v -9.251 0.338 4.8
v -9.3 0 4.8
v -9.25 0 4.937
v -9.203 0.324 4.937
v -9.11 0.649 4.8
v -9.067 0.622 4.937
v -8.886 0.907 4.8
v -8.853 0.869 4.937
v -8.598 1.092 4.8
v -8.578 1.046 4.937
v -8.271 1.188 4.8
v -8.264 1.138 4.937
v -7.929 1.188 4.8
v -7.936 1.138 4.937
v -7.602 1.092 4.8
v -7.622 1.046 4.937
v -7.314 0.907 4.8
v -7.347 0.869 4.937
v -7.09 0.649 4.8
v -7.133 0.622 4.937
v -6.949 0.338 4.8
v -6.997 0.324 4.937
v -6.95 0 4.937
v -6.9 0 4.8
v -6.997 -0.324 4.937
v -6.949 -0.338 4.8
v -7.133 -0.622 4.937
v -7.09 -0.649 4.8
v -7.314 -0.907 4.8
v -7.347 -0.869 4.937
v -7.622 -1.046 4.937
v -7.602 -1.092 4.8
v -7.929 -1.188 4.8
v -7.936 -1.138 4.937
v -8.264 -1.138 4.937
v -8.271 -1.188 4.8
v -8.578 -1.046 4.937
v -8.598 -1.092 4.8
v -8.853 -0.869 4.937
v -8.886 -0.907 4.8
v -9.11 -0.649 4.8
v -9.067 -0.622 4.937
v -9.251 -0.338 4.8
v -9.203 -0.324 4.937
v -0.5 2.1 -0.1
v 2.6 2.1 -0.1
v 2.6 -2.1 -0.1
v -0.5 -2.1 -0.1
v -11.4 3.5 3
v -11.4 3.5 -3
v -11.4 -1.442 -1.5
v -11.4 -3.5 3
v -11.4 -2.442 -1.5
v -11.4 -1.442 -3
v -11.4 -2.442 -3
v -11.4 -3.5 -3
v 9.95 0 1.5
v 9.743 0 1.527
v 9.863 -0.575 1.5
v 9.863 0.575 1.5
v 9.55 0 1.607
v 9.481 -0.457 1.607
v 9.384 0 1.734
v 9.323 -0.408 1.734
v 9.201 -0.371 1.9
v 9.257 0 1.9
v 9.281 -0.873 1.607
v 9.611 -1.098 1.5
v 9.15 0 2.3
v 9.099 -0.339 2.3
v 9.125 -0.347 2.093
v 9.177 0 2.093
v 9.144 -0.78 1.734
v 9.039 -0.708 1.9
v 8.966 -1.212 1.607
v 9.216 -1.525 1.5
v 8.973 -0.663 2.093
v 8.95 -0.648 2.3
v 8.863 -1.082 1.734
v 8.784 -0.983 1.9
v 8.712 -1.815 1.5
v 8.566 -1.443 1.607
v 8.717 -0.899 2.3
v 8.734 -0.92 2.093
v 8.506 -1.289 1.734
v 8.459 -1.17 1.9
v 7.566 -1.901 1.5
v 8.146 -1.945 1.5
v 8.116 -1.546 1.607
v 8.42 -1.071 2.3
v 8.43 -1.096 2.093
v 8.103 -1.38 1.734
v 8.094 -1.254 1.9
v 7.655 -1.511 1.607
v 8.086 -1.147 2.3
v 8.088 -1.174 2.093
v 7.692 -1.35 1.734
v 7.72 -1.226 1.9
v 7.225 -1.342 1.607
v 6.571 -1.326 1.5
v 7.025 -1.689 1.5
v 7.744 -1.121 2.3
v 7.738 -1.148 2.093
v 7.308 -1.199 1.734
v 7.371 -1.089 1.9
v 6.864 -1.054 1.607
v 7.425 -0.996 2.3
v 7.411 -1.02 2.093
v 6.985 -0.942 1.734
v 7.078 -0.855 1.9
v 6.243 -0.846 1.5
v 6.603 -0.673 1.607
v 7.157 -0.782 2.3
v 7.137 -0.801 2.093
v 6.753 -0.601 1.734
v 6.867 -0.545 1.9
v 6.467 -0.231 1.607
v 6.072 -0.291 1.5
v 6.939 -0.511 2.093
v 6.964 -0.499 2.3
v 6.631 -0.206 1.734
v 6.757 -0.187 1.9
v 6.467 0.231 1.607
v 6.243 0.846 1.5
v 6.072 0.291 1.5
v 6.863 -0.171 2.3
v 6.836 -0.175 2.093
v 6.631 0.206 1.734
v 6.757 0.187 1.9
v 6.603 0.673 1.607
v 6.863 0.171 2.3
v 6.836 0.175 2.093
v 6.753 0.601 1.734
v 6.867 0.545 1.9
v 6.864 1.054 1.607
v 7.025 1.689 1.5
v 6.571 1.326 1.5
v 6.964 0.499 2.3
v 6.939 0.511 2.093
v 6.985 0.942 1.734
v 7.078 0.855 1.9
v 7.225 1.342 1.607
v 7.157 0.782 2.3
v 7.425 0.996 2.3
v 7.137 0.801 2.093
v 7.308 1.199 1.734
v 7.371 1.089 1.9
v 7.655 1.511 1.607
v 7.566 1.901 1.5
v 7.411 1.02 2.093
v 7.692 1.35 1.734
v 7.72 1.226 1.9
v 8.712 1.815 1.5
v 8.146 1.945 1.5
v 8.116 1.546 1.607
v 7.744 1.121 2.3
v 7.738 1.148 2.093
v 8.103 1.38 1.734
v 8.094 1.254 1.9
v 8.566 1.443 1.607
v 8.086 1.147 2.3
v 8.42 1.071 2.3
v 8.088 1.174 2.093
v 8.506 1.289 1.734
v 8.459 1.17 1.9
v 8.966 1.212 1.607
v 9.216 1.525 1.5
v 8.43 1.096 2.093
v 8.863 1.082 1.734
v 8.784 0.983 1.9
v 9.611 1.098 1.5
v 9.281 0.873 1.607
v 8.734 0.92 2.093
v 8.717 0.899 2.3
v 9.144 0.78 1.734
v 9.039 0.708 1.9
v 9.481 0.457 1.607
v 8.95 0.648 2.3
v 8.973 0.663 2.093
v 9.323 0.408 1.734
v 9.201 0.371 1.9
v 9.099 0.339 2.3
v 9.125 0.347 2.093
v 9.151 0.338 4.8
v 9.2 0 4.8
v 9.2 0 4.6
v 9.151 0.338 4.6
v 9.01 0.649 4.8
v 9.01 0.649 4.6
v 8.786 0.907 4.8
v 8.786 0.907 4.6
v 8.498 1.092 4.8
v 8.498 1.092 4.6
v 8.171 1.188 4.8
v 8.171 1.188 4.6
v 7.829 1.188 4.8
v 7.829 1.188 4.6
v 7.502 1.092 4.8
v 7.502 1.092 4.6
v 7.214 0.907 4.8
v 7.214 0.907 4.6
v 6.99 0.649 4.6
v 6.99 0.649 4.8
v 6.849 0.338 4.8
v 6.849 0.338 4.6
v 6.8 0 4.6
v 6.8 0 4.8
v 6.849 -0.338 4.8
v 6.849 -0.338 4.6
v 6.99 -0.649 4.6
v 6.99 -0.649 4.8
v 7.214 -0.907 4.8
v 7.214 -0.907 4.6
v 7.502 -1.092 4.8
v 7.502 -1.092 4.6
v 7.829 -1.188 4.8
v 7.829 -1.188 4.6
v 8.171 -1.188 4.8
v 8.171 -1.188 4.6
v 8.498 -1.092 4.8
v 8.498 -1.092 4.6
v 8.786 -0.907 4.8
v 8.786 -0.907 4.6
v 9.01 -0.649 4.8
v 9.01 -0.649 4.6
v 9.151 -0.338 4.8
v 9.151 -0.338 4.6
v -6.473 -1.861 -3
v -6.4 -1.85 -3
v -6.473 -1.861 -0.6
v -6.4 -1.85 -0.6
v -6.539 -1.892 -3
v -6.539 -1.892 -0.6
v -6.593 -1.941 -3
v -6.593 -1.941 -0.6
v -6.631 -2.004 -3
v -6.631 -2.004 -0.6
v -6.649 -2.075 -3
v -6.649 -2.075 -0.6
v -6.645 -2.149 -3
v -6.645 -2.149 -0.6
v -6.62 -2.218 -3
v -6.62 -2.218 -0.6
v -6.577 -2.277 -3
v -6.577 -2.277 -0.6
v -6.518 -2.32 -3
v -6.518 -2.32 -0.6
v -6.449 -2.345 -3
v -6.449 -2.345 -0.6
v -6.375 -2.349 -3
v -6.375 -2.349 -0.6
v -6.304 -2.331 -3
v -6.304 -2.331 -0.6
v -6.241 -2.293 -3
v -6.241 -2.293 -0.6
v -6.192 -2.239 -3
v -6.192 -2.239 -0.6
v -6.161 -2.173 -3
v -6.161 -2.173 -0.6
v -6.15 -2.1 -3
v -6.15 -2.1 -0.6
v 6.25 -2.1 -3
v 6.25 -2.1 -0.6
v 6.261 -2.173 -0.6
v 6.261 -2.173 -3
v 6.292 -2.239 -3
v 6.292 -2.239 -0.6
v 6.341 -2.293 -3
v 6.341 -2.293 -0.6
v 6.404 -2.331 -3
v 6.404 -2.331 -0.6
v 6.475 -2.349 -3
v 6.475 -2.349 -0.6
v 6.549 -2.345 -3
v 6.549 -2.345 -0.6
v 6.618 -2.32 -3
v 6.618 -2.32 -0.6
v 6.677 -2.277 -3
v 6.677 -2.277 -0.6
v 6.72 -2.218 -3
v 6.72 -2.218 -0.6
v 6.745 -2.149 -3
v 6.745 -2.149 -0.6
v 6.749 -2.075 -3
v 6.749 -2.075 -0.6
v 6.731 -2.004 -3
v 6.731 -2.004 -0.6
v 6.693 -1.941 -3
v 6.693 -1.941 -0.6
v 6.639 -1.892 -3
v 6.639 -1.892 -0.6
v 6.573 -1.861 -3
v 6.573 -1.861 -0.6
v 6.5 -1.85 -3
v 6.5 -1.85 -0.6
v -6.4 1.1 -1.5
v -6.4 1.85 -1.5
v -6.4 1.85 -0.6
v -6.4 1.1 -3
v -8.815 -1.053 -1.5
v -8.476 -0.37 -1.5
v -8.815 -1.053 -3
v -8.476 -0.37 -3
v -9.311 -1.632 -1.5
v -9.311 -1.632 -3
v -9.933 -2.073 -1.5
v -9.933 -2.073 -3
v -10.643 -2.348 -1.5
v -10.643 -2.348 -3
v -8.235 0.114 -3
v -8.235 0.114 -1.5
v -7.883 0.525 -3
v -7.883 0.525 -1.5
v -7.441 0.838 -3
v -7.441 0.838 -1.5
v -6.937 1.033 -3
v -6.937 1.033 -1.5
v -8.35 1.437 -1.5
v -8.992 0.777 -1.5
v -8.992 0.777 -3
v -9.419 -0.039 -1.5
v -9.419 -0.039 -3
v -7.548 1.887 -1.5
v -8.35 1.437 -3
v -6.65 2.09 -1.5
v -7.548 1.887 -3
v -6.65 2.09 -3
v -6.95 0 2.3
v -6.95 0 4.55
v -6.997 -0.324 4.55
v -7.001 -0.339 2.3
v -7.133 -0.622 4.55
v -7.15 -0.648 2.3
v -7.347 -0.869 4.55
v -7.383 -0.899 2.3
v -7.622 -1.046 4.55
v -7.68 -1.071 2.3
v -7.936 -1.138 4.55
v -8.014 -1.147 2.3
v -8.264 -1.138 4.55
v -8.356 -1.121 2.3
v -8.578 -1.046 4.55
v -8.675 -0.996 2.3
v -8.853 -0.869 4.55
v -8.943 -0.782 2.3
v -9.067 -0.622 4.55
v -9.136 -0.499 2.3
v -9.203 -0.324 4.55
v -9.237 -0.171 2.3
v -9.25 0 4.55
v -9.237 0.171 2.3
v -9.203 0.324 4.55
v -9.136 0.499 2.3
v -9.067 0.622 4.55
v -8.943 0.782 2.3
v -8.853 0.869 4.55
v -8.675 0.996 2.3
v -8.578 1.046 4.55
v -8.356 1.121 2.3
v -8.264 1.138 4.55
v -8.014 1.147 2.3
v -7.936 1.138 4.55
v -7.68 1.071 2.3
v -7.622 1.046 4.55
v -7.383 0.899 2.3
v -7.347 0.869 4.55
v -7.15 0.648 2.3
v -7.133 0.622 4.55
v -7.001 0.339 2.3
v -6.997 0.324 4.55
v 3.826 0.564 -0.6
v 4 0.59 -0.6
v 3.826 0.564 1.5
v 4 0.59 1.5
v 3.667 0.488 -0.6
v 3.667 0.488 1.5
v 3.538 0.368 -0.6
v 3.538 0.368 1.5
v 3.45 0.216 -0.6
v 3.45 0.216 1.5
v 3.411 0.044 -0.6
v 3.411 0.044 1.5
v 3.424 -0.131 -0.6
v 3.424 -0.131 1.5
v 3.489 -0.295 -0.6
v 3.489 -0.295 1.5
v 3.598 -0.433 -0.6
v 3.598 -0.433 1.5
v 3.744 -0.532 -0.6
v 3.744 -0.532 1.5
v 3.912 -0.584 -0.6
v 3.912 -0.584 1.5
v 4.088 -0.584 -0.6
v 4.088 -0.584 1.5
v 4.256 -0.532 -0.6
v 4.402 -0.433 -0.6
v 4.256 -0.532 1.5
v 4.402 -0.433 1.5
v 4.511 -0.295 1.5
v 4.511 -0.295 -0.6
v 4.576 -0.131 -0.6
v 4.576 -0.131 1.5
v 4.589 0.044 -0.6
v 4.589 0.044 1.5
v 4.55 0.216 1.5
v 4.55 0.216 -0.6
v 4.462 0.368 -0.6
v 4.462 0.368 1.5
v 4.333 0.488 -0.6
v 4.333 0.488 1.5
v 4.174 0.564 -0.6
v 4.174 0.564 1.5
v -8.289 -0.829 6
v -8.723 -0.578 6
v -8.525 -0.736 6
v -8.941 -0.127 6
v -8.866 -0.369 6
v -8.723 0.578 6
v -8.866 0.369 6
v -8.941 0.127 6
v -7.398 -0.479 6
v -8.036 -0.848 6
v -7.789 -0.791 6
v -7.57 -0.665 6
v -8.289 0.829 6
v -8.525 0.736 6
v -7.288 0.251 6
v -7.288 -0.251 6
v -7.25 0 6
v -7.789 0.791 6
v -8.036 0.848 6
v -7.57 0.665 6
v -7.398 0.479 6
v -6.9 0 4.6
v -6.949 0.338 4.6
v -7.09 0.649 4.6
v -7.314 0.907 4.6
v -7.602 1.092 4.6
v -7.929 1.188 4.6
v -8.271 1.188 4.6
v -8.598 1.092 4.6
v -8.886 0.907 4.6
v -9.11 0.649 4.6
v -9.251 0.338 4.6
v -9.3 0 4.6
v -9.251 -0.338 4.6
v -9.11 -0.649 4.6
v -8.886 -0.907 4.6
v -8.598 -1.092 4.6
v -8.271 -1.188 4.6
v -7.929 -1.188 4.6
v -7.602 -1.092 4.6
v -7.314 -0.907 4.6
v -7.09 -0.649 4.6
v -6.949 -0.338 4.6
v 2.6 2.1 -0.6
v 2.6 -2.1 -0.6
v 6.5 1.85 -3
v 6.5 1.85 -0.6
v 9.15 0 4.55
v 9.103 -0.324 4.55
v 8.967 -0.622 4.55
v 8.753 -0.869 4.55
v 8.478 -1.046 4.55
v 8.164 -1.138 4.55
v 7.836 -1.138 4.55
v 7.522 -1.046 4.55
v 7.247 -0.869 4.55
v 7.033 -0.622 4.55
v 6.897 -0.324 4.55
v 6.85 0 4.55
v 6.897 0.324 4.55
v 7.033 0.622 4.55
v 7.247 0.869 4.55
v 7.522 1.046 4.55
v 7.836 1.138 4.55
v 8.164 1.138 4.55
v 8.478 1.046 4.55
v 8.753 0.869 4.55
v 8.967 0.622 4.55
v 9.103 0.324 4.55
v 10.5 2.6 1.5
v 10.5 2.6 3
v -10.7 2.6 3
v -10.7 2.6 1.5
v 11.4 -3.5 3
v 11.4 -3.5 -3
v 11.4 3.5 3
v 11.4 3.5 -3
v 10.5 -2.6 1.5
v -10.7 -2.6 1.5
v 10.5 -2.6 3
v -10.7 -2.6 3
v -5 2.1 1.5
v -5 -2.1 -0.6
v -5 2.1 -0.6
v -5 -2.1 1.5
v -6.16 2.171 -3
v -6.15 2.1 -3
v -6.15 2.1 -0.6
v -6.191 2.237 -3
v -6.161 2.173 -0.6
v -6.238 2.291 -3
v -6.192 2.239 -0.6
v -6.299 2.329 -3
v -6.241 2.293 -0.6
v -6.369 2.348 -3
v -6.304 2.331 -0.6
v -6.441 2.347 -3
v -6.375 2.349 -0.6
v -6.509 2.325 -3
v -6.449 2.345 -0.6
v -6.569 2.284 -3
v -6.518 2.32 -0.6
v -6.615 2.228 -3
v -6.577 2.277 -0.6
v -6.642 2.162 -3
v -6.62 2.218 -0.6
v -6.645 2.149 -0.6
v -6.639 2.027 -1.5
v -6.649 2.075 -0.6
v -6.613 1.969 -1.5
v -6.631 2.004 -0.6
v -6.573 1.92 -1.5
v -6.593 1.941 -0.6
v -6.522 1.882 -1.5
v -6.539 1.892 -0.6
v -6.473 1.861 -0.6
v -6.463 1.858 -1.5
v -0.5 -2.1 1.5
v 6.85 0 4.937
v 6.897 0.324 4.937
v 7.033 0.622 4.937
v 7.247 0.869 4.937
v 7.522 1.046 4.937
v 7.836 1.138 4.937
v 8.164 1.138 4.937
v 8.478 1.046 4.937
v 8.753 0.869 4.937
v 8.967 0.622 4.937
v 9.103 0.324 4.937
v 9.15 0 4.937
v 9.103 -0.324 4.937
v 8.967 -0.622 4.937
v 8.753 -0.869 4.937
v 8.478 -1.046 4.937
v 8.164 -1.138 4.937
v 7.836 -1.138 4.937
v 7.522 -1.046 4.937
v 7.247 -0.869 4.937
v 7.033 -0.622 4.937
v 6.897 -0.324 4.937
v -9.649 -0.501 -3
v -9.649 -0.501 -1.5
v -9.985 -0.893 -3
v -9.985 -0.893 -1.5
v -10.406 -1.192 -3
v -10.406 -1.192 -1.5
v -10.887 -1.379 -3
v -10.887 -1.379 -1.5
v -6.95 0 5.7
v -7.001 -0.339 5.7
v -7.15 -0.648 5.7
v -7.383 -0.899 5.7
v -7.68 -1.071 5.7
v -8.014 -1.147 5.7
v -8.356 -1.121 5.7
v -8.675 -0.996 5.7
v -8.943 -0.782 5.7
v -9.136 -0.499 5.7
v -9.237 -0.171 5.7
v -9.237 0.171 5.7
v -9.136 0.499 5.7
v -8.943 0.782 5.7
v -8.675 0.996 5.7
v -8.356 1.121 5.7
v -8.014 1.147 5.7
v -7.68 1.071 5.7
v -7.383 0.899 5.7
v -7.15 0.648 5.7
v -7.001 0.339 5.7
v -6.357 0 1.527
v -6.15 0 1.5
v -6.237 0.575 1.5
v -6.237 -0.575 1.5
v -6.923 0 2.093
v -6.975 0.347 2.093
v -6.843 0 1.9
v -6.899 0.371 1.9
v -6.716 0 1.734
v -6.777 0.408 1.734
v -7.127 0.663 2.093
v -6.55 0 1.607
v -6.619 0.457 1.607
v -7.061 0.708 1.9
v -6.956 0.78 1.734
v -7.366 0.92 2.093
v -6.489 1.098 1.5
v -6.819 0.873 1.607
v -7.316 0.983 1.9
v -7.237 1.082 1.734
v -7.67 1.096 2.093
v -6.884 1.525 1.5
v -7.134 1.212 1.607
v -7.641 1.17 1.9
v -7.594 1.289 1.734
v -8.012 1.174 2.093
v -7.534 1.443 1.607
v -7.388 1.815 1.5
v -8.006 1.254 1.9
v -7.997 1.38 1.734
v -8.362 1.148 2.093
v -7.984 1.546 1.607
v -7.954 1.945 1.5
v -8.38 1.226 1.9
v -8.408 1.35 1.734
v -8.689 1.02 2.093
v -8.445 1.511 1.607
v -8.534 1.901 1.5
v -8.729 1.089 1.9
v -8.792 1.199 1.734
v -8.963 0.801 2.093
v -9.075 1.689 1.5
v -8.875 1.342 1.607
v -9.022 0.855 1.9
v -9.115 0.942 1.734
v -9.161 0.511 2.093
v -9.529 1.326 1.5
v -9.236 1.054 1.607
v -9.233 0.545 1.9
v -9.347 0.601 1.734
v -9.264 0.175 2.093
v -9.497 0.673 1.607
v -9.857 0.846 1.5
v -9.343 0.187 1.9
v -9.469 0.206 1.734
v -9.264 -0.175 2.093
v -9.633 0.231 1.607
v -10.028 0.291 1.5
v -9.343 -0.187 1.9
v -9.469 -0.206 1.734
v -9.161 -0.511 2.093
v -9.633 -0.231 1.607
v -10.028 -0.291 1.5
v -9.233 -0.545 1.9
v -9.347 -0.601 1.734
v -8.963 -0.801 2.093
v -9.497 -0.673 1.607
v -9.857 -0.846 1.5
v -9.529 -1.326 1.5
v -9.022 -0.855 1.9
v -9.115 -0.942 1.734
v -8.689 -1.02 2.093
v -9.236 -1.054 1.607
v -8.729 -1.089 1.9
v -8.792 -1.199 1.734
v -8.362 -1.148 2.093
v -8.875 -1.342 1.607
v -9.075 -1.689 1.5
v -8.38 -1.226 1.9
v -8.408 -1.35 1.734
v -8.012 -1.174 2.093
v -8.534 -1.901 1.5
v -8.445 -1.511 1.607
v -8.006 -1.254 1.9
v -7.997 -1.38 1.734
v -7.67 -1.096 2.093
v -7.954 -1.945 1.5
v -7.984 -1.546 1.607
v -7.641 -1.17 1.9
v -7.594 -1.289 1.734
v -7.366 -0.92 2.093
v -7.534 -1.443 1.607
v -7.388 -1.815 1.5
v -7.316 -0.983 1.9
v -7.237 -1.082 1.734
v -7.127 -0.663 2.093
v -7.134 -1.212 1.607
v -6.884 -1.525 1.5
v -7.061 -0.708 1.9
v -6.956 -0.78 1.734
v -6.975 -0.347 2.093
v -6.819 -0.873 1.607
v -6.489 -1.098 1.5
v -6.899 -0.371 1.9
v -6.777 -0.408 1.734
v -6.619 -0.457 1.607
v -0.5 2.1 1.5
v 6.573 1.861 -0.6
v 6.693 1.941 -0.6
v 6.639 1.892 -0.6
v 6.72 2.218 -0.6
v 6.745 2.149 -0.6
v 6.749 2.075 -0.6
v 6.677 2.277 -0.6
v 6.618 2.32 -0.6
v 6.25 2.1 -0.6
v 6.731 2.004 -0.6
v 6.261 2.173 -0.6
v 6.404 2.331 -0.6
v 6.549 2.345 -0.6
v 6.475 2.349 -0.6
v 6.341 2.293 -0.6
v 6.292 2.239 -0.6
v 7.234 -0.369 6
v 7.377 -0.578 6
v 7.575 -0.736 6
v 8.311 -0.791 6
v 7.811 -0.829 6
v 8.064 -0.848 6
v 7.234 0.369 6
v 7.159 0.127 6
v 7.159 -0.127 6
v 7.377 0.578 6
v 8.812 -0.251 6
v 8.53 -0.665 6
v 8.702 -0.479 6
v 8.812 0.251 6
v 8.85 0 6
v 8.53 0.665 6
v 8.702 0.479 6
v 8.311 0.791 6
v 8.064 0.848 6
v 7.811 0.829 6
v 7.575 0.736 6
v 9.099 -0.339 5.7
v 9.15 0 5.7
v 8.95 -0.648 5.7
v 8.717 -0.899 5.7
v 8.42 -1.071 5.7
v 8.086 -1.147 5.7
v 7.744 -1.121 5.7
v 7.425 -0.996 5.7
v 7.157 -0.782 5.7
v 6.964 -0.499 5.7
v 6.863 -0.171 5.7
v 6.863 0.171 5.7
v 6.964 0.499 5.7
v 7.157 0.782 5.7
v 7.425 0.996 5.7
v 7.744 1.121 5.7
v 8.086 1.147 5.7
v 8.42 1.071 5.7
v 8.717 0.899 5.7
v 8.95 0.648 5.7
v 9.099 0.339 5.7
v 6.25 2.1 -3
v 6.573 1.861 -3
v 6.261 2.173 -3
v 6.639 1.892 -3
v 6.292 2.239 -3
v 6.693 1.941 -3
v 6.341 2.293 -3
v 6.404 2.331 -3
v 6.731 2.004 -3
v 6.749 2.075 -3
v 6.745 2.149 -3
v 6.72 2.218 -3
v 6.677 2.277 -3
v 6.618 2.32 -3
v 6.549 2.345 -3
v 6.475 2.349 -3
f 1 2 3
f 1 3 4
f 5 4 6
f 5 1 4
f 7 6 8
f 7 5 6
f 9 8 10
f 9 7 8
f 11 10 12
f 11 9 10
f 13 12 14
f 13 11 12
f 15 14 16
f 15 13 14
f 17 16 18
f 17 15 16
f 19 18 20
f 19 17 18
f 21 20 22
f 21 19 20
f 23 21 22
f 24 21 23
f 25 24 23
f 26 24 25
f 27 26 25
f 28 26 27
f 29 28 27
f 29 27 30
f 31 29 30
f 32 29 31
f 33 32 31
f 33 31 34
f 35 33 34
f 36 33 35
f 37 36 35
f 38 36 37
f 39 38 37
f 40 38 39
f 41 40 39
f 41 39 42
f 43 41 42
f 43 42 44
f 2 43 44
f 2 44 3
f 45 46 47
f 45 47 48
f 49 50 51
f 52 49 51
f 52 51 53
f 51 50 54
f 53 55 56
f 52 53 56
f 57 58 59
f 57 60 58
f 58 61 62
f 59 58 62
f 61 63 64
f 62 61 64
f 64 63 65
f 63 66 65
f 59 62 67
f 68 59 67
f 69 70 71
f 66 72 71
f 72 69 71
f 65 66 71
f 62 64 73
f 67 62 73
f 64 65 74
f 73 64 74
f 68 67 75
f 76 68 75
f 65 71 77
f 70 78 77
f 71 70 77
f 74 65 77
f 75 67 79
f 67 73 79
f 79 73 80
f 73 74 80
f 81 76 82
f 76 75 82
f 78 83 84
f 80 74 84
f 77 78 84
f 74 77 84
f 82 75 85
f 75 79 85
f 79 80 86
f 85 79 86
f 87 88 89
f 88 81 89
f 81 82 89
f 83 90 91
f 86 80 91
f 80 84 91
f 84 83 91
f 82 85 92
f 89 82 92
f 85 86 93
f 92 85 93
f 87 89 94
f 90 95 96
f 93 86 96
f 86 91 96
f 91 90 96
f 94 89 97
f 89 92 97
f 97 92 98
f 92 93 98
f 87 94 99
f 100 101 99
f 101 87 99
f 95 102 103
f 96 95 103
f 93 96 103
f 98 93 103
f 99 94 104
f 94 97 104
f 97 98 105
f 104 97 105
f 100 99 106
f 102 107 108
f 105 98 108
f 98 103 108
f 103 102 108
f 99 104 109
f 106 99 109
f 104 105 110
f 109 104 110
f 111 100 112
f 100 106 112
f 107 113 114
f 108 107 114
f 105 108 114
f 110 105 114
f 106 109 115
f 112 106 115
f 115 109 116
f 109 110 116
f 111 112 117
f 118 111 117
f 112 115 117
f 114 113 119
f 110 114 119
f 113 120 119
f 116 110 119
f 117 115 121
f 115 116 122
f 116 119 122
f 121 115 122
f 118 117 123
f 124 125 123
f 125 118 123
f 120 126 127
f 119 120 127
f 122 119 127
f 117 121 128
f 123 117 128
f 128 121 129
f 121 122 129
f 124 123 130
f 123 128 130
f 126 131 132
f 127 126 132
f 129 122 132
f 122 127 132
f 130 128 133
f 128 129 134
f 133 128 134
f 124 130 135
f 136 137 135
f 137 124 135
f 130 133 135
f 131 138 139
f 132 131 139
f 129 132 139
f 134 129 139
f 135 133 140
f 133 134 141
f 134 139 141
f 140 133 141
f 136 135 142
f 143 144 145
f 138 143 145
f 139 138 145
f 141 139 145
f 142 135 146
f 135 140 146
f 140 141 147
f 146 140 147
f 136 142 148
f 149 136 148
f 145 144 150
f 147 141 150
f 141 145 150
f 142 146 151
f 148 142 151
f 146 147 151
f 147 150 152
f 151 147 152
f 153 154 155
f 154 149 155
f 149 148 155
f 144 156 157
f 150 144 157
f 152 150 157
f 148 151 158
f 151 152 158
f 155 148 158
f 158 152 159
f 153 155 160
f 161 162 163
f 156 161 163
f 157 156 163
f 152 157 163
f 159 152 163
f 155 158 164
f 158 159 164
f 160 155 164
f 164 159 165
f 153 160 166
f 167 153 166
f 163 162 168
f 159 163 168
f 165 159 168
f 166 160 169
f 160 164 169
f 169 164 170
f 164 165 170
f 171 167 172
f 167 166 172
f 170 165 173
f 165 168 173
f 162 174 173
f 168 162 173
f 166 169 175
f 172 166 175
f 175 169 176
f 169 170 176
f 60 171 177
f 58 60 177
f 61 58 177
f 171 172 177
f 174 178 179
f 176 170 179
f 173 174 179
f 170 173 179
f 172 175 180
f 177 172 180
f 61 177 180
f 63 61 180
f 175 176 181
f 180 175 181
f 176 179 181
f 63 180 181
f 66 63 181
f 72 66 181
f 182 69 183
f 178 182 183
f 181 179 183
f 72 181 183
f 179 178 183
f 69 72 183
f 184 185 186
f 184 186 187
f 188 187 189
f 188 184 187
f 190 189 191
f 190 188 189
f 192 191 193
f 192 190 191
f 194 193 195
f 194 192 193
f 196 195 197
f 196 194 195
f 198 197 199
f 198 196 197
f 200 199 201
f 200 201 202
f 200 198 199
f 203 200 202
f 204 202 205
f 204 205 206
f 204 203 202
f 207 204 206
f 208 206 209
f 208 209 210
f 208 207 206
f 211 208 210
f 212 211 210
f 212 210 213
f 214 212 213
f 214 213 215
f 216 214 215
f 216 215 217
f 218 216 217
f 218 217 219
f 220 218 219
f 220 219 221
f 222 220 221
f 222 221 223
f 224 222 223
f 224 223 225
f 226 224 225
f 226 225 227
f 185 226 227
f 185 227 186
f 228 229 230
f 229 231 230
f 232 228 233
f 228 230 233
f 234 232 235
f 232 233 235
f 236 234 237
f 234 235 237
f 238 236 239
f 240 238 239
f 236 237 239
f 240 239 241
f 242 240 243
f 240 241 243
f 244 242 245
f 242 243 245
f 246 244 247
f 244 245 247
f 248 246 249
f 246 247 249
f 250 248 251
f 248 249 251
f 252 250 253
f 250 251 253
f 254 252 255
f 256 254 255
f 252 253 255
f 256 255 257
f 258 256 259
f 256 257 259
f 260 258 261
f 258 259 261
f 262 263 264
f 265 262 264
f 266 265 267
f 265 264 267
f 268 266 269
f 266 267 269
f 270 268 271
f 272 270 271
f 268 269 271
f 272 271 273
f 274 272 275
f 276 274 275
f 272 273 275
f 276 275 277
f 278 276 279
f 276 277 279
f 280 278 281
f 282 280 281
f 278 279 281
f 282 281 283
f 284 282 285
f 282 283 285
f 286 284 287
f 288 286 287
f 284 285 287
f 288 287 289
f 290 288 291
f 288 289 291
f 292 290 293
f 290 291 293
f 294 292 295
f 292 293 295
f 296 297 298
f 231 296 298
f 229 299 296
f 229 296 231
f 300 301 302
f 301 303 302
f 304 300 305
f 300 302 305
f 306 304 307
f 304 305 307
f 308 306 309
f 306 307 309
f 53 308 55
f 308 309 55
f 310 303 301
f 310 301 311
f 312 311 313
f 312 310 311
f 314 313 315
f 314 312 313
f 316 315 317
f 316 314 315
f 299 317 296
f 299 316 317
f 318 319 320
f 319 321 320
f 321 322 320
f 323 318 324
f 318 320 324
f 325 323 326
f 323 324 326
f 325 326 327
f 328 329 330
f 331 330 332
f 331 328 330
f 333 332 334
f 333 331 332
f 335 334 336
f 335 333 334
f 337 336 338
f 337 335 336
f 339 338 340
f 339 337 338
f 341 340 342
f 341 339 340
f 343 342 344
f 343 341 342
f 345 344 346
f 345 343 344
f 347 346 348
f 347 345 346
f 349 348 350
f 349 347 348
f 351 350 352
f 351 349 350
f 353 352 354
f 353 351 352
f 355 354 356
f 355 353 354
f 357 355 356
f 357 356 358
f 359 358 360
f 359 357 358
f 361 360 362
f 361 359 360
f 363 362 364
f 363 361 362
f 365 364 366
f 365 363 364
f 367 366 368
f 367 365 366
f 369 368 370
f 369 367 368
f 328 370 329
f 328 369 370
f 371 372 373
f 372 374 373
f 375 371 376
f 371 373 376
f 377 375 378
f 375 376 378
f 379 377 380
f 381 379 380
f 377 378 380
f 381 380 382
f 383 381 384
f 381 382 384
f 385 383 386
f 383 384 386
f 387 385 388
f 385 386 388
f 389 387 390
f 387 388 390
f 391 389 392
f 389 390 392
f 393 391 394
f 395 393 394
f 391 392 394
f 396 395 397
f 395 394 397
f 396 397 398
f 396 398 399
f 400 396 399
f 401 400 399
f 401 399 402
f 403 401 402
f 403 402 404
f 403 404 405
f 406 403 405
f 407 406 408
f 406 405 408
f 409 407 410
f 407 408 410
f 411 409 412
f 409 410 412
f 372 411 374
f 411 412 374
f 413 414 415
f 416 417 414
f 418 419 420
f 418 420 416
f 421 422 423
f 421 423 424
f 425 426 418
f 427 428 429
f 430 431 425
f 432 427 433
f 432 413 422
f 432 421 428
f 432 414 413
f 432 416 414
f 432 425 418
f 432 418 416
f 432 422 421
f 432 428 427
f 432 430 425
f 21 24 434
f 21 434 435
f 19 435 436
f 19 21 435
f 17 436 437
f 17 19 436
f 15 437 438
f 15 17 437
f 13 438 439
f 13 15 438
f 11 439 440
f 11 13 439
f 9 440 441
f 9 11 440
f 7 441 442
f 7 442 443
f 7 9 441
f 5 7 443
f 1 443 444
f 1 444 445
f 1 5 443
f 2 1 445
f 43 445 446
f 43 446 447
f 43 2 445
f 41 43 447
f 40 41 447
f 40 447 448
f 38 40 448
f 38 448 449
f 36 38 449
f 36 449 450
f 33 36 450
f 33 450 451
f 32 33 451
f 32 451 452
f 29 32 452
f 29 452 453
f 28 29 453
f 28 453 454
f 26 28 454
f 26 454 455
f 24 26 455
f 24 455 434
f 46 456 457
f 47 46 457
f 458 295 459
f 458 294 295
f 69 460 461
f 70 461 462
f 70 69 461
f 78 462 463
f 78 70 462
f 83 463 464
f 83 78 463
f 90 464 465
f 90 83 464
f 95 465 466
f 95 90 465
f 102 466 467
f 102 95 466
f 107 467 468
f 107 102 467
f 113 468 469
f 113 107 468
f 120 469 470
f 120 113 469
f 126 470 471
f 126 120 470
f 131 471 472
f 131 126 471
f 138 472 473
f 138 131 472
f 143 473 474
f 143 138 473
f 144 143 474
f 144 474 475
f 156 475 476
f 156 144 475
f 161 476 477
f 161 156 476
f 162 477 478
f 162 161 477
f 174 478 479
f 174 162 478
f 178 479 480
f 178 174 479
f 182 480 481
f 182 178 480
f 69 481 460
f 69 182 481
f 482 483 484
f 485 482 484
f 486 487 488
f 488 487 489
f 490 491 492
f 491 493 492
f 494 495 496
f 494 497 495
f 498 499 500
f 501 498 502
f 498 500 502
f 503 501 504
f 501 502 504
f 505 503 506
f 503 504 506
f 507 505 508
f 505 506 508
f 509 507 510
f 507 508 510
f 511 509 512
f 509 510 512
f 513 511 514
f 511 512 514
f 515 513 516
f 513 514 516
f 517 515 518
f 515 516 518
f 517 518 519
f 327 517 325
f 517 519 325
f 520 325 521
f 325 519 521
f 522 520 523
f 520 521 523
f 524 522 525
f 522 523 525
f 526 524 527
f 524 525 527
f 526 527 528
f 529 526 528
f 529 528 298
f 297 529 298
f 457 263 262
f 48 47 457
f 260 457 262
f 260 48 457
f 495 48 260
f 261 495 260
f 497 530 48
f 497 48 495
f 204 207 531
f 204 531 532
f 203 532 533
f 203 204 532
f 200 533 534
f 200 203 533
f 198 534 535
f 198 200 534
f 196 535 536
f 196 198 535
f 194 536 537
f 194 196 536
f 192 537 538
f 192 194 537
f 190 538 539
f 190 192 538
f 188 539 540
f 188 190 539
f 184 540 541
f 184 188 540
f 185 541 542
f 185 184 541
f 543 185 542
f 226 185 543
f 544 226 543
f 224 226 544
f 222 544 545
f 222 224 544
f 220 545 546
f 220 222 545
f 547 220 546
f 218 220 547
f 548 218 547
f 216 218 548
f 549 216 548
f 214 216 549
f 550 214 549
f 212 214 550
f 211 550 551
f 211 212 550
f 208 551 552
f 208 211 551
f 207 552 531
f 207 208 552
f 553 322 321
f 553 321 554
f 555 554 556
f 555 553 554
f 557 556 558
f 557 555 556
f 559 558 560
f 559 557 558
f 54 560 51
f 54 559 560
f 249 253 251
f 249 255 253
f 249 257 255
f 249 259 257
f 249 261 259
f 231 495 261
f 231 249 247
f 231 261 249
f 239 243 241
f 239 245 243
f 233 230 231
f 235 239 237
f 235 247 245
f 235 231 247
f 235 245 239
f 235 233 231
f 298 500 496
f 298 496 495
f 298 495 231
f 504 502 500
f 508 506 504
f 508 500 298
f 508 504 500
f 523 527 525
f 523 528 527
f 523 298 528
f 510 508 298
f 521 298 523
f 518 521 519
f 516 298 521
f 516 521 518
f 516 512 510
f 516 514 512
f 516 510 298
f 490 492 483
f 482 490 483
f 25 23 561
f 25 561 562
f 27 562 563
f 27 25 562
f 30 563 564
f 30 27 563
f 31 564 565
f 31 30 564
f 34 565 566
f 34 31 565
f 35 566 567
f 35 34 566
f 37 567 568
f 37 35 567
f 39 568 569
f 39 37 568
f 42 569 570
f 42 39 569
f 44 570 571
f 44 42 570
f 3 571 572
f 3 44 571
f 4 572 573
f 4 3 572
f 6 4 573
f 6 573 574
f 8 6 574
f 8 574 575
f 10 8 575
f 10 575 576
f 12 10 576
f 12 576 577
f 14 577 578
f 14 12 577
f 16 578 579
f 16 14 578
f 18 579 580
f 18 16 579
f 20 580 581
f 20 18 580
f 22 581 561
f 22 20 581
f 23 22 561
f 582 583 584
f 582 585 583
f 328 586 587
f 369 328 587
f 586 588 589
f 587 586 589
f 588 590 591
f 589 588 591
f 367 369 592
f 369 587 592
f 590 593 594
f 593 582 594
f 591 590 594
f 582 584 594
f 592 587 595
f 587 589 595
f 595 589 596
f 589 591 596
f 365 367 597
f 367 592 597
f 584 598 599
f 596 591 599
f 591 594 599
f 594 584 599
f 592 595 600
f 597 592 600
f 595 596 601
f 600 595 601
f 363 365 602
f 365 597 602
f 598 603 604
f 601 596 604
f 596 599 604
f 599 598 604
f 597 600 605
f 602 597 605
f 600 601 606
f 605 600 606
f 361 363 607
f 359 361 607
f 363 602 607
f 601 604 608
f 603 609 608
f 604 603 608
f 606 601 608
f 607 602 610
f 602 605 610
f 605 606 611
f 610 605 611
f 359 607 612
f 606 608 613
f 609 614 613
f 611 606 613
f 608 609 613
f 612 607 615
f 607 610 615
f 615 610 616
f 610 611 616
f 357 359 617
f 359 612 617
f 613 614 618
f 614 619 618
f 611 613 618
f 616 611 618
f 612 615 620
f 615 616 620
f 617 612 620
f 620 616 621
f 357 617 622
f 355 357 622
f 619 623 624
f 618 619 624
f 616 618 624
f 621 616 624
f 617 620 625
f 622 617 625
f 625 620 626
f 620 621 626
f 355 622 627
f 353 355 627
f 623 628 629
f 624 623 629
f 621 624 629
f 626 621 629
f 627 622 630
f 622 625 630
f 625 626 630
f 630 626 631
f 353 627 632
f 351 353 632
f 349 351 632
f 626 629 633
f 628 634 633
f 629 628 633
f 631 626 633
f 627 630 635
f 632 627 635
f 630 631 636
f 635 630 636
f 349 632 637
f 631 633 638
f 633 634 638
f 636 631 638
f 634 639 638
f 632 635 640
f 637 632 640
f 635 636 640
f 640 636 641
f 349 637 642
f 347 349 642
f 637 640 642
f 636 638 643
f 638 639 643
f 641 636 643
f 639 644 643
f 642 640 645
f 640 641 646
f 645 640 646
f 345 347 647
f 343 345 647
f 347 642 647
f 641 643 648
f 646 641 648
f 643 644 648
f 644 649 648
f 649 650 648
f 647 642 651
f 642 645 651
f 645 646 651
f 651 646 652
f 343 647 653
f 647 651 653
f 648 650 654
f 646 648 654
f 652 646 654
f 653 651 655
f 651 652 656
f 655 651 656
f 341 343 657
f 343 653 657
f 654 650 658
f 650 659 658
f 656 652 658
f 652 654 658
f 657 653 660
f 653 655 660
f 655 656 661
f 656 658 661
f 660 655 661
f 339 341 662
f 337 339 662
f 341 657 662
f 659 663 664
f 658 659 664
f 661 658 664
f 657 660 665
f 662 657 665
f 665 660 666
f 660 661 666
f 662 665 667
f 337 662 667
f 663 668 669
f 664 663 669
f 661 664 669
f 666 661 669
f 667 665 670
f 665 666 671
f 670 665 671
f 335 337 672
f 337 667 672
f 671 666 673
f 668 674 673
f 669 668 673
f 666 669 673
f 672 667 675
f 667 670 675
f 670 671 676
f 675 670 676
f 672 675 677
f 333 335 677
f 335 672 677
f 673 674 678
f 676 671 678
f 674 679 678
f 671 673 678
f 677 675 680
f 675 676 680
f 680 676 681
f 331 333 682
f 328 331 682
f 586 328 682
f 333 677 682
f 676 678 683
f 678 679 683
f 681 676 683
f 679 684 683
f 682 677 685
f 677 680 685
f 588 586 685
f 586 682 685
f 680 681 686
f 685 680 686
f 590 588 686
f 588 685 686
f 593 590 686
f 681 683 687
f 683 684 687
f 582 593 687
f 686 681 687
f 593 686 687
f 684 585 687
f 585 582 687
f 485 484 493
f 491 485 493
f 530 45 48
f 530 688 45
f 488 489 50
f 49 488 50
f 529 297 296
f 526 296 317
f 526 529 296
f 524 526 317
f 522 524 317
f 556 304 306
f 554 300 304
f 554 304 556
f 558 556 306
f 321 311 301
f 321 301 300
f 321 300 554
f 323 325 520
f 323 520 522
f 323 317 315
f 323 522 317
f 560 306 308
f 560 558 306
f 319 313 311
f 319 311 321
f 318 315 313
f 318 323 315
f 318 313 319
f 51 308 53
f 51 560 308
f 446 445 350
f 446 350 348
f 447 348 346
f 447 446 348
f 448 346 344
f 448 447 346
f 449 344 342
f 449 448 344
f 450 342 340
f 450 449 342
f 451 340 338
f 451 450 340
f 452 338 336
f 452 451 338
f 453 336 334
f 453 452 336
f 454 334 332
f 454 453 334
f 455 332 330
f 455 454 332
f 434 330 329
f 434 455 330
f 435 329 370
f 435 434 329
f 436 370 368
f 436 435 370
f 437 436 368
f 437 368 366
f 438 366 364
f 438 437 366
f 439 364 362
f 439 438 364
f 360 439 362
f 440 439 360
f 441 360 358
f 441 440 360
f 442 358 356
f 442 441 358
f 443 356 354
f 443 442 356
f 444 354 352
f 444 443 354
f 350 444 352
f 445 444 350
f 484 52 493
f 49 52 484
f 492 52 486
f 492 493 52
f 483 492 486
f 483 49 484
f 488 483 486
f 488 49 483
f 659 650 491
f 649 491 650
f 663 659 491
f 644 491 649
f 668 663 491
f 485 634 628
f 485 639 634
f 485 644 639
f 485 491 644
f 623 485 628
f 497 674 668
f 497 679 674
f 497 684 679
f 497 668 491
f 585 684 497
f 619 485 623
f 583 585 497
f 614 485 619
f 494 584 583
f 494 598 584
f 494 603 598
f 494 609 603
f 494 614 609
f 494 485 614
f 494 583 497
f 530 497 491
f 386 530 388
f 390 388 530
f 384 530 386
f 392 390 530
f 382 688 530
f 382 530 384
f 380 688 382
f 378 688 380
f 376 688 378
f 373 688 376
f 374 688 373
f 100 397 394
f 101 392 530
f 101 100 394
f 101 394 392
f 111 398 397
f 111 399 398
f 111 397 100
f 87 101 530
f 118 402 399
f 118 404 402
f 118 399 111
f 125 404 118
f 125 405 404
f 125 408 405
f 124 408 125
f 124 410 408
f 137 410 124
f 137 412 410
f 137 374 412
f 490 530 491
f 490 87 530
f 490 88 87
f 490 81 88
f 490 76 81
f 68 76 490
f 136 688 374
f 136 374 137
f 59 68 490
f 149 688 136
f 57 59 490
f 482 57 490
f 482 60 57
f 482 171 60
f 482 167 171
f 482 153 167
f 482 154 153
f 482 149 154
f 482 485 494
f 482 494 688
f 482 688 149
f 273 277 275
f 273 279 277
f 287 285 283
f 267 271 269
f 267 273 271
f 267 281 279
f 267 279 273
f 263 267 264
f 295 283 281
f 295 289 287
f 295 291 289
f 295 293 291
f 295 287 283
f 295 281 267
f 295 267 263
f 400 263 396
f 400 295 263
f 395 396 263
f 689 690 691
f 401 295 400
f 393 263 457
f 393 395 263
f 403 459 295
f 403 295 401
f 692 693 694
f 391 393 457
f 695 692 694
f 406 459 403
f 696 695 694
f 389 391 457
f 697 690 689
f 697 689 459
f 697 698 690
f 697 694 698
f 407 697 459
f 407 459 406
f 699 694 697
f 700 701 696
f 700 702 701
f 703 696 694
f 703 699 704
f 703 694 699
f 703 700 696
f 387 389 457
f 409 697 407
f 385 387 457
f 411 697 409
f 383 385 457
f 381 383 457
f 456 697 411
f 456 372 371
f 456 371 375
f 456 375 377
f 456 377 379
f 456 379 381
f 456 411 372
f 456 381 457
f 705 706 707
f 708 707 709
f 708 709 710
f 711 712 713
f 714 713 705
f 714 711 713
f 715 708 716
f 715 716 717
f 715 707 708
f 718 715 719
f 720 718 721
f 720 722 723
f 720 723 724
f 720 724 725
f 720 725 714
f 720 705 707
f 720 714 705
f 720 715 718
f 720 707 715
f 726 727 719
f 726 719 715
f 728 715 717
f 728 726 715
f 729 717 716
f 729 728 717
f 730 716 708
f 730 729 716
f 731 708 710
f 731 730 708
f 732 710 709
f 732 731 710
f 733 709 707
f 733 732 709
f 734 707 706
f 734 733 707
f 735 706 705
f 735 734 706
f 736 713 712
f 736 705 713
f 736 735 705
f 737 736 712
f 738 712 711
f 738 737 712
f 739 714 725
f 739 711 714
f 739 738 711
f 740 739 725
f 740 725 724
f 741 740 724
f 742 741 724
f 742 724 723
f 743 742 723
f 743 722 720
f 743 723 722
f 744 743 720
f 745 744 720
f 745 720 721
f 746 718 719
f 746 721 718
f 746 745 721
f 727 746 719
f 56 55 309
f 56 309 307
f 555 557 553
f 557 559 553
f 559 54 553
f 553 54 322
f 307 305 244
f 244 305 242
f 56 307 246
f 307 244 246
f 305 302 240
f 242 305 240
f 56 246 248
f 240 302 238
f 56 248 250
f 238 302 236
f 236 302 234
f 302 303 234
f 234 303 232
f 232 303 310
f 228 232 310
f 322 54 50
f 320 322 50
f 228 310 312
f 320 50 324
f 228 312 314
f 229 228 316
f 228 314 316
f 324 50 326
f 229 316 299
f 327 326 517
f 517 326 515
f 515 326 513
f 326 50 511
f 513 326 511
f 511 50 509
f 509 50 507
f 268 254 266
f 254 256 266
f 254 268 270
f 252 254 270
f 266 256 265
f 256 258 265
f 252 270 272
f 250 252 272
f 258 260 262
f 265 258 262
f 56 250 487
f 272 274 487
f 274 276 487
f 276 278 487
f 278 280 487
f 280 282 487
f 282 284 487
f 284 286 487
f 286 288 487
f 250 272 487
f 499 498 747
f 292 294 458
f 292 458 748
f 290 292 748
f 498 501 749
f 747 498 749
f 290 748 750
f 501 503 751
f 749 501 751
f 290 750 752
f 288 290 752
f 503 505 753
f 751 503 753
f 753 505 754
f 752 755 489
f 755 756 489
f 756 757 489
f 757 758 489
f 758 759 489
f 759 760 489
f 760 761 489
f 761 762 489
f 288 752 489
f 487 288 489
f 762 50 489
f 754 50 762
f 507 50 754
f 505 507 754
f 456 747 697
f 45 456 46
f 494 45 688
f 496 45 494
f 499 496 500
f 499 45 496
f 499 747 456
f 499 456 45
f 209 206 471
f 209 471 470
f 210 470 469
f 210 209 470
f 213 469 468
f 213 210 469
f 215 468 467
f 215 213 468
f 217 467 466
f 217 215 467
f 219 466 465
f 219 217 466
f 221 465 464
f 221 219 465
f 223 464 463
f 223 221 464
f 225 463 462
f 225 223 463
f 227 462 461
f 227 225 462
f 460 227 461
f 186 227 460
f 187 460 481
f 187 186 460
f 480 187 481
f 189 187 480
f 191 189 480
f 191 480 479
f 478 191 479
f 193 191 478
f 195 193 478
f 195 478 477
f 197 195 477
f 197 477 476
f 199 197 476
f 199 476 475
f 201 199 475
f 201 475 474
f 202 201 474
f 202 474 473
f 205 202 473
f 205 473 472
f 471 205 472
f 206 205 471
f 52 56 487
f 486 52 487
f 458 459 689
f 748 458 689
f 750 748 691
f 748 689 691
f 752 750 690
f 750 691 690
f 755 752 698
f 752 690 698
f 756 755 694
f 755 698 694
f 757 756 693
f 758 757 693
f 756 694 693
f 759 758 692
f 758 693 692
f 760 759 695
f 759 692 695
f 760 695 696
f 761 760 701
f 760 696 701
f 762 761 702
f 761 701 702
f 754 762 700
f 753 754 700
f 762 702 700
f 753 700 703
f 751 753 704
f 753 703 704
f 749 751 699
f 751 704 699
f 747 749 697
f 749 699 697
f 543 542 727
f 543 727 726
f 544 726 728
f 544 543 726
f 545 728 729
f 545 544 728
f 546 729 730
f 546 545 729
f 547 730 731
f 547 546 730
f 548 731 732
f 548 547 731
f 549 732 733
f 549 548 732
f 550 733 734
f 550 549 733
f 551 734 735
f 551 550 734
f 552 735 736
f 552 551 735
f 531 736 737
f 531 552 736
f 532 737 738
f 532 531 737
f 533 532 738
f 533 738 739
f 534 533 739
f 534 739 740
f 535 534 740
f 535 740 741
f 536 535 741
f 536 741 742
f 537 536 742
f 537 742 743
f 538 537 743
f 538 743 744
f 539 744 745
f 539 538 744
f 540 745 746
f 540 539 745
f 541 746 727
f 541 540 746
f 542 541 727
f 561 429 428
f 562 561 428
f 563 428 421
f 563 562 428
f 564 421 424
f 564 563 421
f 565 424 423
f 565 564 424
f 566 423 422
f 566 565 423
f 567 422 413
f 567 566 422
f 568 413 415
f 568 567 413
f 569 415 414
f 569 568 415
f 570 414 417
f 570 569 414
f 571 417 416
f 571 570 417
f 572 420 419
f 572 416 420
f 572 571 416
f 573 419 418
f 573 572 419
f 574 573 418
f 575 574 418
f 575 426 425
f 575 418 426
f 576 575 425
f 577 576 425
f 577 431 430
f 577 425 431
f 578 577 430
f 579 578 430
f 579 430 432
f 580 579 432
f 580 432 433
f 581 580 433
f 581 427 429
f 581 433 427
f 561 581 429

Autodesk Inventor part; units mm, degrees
ref_plane "YZ Plane" through (0, 0, 0) normal (1, 0, 0) x (0, 1, 0)
sketch "Sketch1" plane through (0, 0, 0) normal (0, 0, 1) x (1, 0, 0)
  line L0 (-11.4, -3.5) -> (11.4, -3.5)
  line L1 (11.4, -3.5) -> (11.4, 3.5)
  line L2 (11.4, 3.5) -> (-11.4, 3.5)
  line L3 (-11.4, 3.5) -> (-11.4, -3.5)
  line L4 (-11.4, -3.5) -> (11.4, 3.5) construction
  line L5 (11.4, -3.5) -> (-11.4, 3.5) construction
  point P0 (0, 0)
  dimension "d0" = 22.8
  dimension "d1" = 7
extrude "Extrusion1" add sketch "Sketch1" along normal mid plane 6
sketch "Sketch2" plane through (0, 0, 3) normal (0, 0, 1) x (1, 0, 0)
  line L0 (-5, 2.1) -> (-0.5, 2.1)
  line L1 (-0.5, 2.1) -> (-0.5, -2.1)
  line L2 (-0.5, -2.1) -> (-5, -2.1)
  line L3 (-5, -2.1) -> (-5, 2.1)
  line L4 (-5, 2.1) -> (-0.5, -2.1) construction
  line L5 (-0.5, 2.1) -> (-5, -2.1) construction
  line L6 (-11.4, 3.5) -> (-11.4, -3.5) projected
  line L7 (-2.75, 0) -> (-11.4, 0) construction
  point P0 (0, 0)
  dimension "d4" = 4.2
  dimension "d5" = 4.5
  dimension "d6" = 6.4
extrude "Extrusion2" cut sketch "Sketch2" against normal through all
sketch "Sketch3" plane through (0, 0, 3) normal (0, 0, 1) x (1, 0, 0)
  line L0 (-5, -2.1) -> (-5, 2.1) projected
  line L1 (-5, 2.1) -> (-0.5, 2.1) projected
  line L2 (-0.5, 2.1) -> (-0.5, -2.1) projected
  line L3 (-0.5, -2.1) -> (-5, -2.1) projected
  line L4 (-11.4, -3.5) -> (11.4, -3.5) projected
  line L5 (11.4, -3.5) -> (11.4, 3.5) projected
  line L6 (11.4, 3.5) -> (-11.4, 3.5) projected
  line L7 (-11.4, 3.5) -> (-11.4, -3.5) projected
  line L8 (-10.7, -2.6) -> (10.5, -2.6)
  line L9 (10.5, -2.6) -> (10.5, 2.6)
  line L10 (10.5, 2.6) -> (-10.7, 2.6)
  line L11 (-10.7, 2.6) -> (-10.7, -2.6)
  line L12 (-10.7, -2.6) -> (10.5, 2.6) construction
  line L13 (10.5, -2.6) -> (-10.7, 2.6) construction
  dimension "d11" = 0.7
  dimension "d12" = 0.9
  dimension "d13" = 5.2
  dimension "d14" = 21.2
extrude "Extrusion3" cut sketch "Sketch3" against normal blind 1.5 contours L11 L10 L9 L8
sketch "Sketch4" plane through (0, 0, -3) normal (0, 0, -1) x (-1, 0, 0)
  line L0 (-2.6, -2.1) -> (5, -2.1)
  line L1 (5, -2.1) -> (5, 2.1)
  line L2 (5, 2.1) -> (-2.6, 2.1)
  line L3 (-2.6, 2.1) -> (-2.6, -2.1)
  line L4 (-2.6, -2.1) -> (5, 2.1) construction
  line L5 (5, -2.1) -> (-2.6, 2.1) construction
  line L6 (5, 2.1) -> (5, -2.1) projected
  line L7 (5, -2.1) -> (0.5, -2.1) projected
  line L8 (0.5, -2.1) -> (0.5, 2.1) projected
  line L9 (0.5, 2.1) -> (5, 2.1) projected
  line L10 (-11.4, -3.5) -> (11.4, -3.5) projected
  line L11 (11.4, -3.5) -> (11.4, 3.5) projected
  line L12 (11.4, 3.5) -> (-11.4, 3.5) projected
  line L13 (-11.4, 3.5) -> (-11.4, -3.5) projected
  line L14 (0.5, 2.1) -> (5, 2.1) projected
  line L15 (5, -2.1) -> (0.5, -2.1) projected
  line L16 (5, 2.1) -> (5, -2.1) projected
  point P0 (0, 0)
  point P1 (1.2, 0)
  dimension "d17" = 14
extrude "Extrusion4" cut sketch "Sketch4" against normal blind 2.9 contours L3 L2 L8 L0 | L8 L2 L1 L0
sketch "Sketch5" plane through (0, 0, -3) normal (0, 0, -1) x (-1, 0, 0)
  line L0 (6.4, -2.1) -> (-6.5, -2.1)
  line L1 (-6.5, -2.1) -> (-6.5, 2.1)
  line L2 (-6.5, 2.1) -> (6.4, 2.1)
  line L3 (6.4, 2.1) -> (6.4, -2.1)
  line L4 (6.4, -2.1) -> (-6.5, 2.1) construction
  line L5 (-6.5, -2.1) -> (6.4, 2.1) construction
  line L6 (-2.6, 2.1) -> (5, 2.1) projected
  line L7 (5, -2.1) -> (-2.6, -2.1) projected
  line L8 (11.4, -3.5) -> (11.4, 3.5) projected
  point P0 (0, 0)
  point P1 (-0.05, 0)
  dimension "d20" = 12.9
  dimension "d21" = 5
extrude "Extrusion5" cut sketch "Sketch5" against normal blind 2.4
sketch "Sketch6" plane through (0, 0, -3) normal (0, 0, -1) x (-1, 0, 0)
  line L0 (-6.5, 2.1) -> (6.4, 2.1) projected
  line L1 (6.4, 2.1) -> (6.4, -2.1) projected
  line L2 (6.4, -2.1) -> (-6.5, -2.1) projected
  line L3 (-6.5, -2.1) -> (-6.5, 2.1) projected
  line L4 (-11.4, -3.5) -> (11.4, -3.5) projected
  line L5 (11.4, -3.5) -> (11.4, 3.5) projected
  line L6 (11.4, 3.5) -> (-11.4, 3.5) projected
  line L7 (-11.4, 3.5) -> (-11.4, -3.5) projected
  point P0 (0, 0)
hole "Hole1" at (-6.4, 2.1, -3) at (-6.4, -2.1, -3) at (6.5, -2.1, -3) at (6.5, 2.1, -3) direction (0, 0, 1) diameter 0.5 depth 2.4
sketch "Sketch7" plane through (0, 0, -3) normal (0, 0, -1) x (-1, 0, 0)
  line L0 (-11.4, -3.5) -> (11.4, -3.5) projected
  line L1 (11.4, -3.5) -> (11.4, 3.5) projected
  line L2 (11.4, 3.5) -> (-11.4, 3.5) projected
  line L3 (-11.4, 3.5) -> (-11.4, -3.5) projected
  arc A0 (-6.5, -1.85) -> (-6.25, -2.1) centre (-6.5, -2.1) ccw projected
  line L4 (-6.5, -1.85) -> (-6.5, 1.85) projected
  arc A1 (-6.25, 2.1) -> (-6.5, 1.85) centre (-6.5, 2.1) ccw projected
  line L5 (-6.25, 2.1) -> (6.15, 2.1) projected
  arc A2 (6.4, 1.85) -> (6.15, 2.1) centre (6.4, 2.1) ccw projected
  line L6 (6.4, 1.85) -> (6.4, -1.85) projected
  arc A3 (6.15, -2.1) -> (6.4, -1.85) centre (6.4, -2.1) ccw projected
  line L7 (6.15, -2.1) -> (-6.25, -2.1) projected
  line L8 (-6.5, -1.85) -> (-6.5, 1.85) projected
  line L9 (-11.4, 3.5) -> (-11.4, -3.5) projected
  line L10 (11.4, -3.5) -> (11.4, 3.5) projected
  line L11 (6.4, 1.85) -> (6.4, -1.85) projected
  arc A4 (9.4189, -0.0387) -> (6.4, 2.1) centre (6.4, -1.1) ccw
  arc A5 (8.4755, -0.3703) -> (6.4, 1.1) centre (6.4, -1.1) ccw
  arc A6 (9.4189, -0.0387) -> (11.4, -1.4422) centre (11.4, 0.6578) ccw
  arc A7 (8.4755, -0.3703) -> (11.4, -2.4422) centre (11.4, 0.6578) ccw
  line L12 (6.4, 1.1) -> (6.4, 2.1)
  line L13 (11.4, -2.4422) -> (11.4, -1.4422)
  line L14 (11.4, 3.5) -> (11.4, -3.5) projected
  point P0 (0, 0)
  dimension "d36" = 1
  dimension "d37" = 2.2
  dimension "d38" = 2.1
extrude "Extrusion7" cut sketch "Sketch7" against normal blind 1.5 contours A7 A5 L6 A2 A4 A6 L1 | A2 L12 A4
sketch "Sketch8" plane through (0, 0, -0.6) normal (0, 0, -1) x (-1, 0, 0)
  line L0 (11.4, 3.5) -> (-11.4, 3.5) projected
  line L1 (11.4, -3.5) -> (11.4, -2.4422) projected
  point P0 (0, 0)
  point P1 (-4, 0)
  dimension "d41" = 3.5
  dimension "d42" = 15.4
hole "Hole2" at (4, 0, -0.6) direction (0, 0, 1) diameter 1.181 end through all thread size "0-80 UNF" class "2B" standard "ANSI Unified Screw Threads"
sketch "Sketch9" plane through (0, 0, 1.5) normal (0, 0, 1) x (1, 0, 0)
  circle A0 centre (-8.1, 0) radius 1.15
  circle A1 centre (8, 0) radius 1.15
  line L0 (-8.1, 0) -> (8, 0) construction
  line L1 (11.4, 3.5) -> (-11.4, 3.5) projected
  line L2 (-11.4, 3.5) -> (-11.4, -3.5) projected
  point P0 (0, 0)
  dimension "d50" = 3.5
  dimension "d51" = 16.1
  dimension "d52" = 3.3
  dimension "d53" = 2.3
extrude "Extrusion8" add sketch "Sketch9" along normal blind 4.5
chamfer "Chamfer1" distance 0.3 angle 45 2 edges at (-9.25, 0, 6) (6.85, 0, 6)
ref_plane "Work Plane1" through (-8.1, 0, 4.8) normal (0, 0, 1) x (1, 0, 0)
sketch "Sketch10" plane through (-8.1, 0, 4.8) normal (0, 0, 1) x (1, 0, 0)
  circle A0 centre (0, 0) radius 1.15 projected
  circle A1 centre (16.1, 0) radius 1.15 projected
  circle A2 centre (0, 0) radius 1.2
  circle A3 centre (16.1, 0) radius 1.2
  point P0 (8.1, 0)
  dimension "d60" = 2.4
  dimension "d61" = 2.4
extrude "Extrusion9" add sketch "Sketch10" against normal blind 0.2
ref_plane "Work Plane2" through (-11.4, 0, 3) normal (0, -1, 0) x (1, 0, 0)
sketch "Sketch11" plane through (-11.4, 0, 3) normal (0, -1, 0) x (1, 0, 0)
  line L0 (4.45, 2.7) -> (2.15, 2.7) projected
  line L1 (4.45, 1.8) -> (2.15, 1.8) projected
  line L2 (2.1, 1.6) -> (4.5, 1.6) projected
  line L3 (2.1, 1.8) -> (4.5, 1.8) projected
  line L4 (2.15, 1.6) -> (4.45, 1.6) projected
  line L5 (2.15, -1.5) -> (4.45, -1.5) projected
  line L6 (20.55, 2.7) -> (18.25, 2.7) projected
  line L7 (20.55, 1.8) -> (18.25, 1.8) projected
  line L8 (18.2, 1.6) -> (20.6, 1.6) projected
  line L9 (18.2, 1.8) -> (20.6, 1.8) projected
  line L10 (18.25, 1.6) -> (20.55, 1.6) projected
  line L11 (18.25, -1.5) -> (20.55, -1.5) projected
  line L12 (2.1, 1.8) -> (4.5, 1.8) projected
  line L13 (2.1, 1.8) -> (2.15, 1.9374)
  line L14 (2.1, 1.6) -> (2.15, 1.55)
  line L15 (2.15, -1.5) -> (2.15, 1.6) projected
  line L16 (2.15, 1.8) -> (2.15, 2.7) projected
  line L17 (2.15, 1.9374) -> (2.15, 1.8)
  line L18 (2.1, 1.8) -> (2.15, 1.8)
  line L19 (2.15, 1.55) -> (2.15, 1.6)
  line L20 (2.1, 1.6) -> (4.5, 1.6) projected
  line L21 (2.1, 1.6) -> (2.15, 1.6)
  line L22 (2.45, 3) -> (4.15, 3) projected
  line L23 (3.3, 3) -> (3.3, 1.6)
  line L24 (2.15, 1.6) -> (4.45, 1.6) projected
  point P0 (11.4, -3)
  dimension "d68" = 20
  dimension "d69" = 45
revolve "Revolution1" add sketch "Sketch11" angle 360 about axis through (-8.1, 0, 6) along (0, 0, -1) contours L15 L14 L2 | L16 L3 L13
sketch "Sketch12" plane through (-11.4, 0, 3) normal (0, -1, 0) x (1, 0, 0)
  line L0 (18.25, 1.8) -> (18.25, 2.7) projected
  line L1 (18.2, 1.8) -> (20.6, 1.8) projected
  line L2 (18.2, 1.8) -> (18.2, 1.6) projected
  line L3 (18.25, -1.5) -> (18.25, 1.6) projected
  line L4 (18.2, 1.6) -> (20.6, 1.6) projected
  line L5 (20.6, 1.8) -> (20.6, 1.6) projected
  line L6 (20.55, 1.8) -> (20.55, 2.7) projected
  line L7 (20.55, -1.5) -> (20.55, 1.6) projected
  line L8 (18.2, 1.8) -> (18.25, 1.9374)
  line L9 (20.55, 1.8) -> (18.25, 1.8) projected
  line L10 (18.25, 1.8) -> (18.25, 1.9374)
  line L11 (18.25, 1.8) -> (18.2, 1.8)
  line L12 (18.25, 1.55) -> (18.2, 1.6)
  line L13 (18.25, 1.6) -> (20.55, 1.6) projected
  line L14 (18.25, 1.6) -> (18.2, 1.6)
  line L15 (18.25, 1.6) -> (18.25, 1.55)
  line L16 (18.55, 3) -> (20.25, 3) projected
  line L17 (19.4, 3) -> (19.4, 1.6)
  point P0 (11.4, -3)
  dimension "d71" = 70
  dimension "d72" = 45
revolve "Revolution2" add sketch "Sketch12" angle 360 about axis through (8, 0, 6) along (0, 0, -1) contours L1 L8 L0 | L4 L3 L12
fillet "Fillet1" radius 0.8 2 edges at (-9.25, 0, 1.5) (6.85, 0, 1.5)
properties part number "sipmHolder" material "ABS Plastic"
